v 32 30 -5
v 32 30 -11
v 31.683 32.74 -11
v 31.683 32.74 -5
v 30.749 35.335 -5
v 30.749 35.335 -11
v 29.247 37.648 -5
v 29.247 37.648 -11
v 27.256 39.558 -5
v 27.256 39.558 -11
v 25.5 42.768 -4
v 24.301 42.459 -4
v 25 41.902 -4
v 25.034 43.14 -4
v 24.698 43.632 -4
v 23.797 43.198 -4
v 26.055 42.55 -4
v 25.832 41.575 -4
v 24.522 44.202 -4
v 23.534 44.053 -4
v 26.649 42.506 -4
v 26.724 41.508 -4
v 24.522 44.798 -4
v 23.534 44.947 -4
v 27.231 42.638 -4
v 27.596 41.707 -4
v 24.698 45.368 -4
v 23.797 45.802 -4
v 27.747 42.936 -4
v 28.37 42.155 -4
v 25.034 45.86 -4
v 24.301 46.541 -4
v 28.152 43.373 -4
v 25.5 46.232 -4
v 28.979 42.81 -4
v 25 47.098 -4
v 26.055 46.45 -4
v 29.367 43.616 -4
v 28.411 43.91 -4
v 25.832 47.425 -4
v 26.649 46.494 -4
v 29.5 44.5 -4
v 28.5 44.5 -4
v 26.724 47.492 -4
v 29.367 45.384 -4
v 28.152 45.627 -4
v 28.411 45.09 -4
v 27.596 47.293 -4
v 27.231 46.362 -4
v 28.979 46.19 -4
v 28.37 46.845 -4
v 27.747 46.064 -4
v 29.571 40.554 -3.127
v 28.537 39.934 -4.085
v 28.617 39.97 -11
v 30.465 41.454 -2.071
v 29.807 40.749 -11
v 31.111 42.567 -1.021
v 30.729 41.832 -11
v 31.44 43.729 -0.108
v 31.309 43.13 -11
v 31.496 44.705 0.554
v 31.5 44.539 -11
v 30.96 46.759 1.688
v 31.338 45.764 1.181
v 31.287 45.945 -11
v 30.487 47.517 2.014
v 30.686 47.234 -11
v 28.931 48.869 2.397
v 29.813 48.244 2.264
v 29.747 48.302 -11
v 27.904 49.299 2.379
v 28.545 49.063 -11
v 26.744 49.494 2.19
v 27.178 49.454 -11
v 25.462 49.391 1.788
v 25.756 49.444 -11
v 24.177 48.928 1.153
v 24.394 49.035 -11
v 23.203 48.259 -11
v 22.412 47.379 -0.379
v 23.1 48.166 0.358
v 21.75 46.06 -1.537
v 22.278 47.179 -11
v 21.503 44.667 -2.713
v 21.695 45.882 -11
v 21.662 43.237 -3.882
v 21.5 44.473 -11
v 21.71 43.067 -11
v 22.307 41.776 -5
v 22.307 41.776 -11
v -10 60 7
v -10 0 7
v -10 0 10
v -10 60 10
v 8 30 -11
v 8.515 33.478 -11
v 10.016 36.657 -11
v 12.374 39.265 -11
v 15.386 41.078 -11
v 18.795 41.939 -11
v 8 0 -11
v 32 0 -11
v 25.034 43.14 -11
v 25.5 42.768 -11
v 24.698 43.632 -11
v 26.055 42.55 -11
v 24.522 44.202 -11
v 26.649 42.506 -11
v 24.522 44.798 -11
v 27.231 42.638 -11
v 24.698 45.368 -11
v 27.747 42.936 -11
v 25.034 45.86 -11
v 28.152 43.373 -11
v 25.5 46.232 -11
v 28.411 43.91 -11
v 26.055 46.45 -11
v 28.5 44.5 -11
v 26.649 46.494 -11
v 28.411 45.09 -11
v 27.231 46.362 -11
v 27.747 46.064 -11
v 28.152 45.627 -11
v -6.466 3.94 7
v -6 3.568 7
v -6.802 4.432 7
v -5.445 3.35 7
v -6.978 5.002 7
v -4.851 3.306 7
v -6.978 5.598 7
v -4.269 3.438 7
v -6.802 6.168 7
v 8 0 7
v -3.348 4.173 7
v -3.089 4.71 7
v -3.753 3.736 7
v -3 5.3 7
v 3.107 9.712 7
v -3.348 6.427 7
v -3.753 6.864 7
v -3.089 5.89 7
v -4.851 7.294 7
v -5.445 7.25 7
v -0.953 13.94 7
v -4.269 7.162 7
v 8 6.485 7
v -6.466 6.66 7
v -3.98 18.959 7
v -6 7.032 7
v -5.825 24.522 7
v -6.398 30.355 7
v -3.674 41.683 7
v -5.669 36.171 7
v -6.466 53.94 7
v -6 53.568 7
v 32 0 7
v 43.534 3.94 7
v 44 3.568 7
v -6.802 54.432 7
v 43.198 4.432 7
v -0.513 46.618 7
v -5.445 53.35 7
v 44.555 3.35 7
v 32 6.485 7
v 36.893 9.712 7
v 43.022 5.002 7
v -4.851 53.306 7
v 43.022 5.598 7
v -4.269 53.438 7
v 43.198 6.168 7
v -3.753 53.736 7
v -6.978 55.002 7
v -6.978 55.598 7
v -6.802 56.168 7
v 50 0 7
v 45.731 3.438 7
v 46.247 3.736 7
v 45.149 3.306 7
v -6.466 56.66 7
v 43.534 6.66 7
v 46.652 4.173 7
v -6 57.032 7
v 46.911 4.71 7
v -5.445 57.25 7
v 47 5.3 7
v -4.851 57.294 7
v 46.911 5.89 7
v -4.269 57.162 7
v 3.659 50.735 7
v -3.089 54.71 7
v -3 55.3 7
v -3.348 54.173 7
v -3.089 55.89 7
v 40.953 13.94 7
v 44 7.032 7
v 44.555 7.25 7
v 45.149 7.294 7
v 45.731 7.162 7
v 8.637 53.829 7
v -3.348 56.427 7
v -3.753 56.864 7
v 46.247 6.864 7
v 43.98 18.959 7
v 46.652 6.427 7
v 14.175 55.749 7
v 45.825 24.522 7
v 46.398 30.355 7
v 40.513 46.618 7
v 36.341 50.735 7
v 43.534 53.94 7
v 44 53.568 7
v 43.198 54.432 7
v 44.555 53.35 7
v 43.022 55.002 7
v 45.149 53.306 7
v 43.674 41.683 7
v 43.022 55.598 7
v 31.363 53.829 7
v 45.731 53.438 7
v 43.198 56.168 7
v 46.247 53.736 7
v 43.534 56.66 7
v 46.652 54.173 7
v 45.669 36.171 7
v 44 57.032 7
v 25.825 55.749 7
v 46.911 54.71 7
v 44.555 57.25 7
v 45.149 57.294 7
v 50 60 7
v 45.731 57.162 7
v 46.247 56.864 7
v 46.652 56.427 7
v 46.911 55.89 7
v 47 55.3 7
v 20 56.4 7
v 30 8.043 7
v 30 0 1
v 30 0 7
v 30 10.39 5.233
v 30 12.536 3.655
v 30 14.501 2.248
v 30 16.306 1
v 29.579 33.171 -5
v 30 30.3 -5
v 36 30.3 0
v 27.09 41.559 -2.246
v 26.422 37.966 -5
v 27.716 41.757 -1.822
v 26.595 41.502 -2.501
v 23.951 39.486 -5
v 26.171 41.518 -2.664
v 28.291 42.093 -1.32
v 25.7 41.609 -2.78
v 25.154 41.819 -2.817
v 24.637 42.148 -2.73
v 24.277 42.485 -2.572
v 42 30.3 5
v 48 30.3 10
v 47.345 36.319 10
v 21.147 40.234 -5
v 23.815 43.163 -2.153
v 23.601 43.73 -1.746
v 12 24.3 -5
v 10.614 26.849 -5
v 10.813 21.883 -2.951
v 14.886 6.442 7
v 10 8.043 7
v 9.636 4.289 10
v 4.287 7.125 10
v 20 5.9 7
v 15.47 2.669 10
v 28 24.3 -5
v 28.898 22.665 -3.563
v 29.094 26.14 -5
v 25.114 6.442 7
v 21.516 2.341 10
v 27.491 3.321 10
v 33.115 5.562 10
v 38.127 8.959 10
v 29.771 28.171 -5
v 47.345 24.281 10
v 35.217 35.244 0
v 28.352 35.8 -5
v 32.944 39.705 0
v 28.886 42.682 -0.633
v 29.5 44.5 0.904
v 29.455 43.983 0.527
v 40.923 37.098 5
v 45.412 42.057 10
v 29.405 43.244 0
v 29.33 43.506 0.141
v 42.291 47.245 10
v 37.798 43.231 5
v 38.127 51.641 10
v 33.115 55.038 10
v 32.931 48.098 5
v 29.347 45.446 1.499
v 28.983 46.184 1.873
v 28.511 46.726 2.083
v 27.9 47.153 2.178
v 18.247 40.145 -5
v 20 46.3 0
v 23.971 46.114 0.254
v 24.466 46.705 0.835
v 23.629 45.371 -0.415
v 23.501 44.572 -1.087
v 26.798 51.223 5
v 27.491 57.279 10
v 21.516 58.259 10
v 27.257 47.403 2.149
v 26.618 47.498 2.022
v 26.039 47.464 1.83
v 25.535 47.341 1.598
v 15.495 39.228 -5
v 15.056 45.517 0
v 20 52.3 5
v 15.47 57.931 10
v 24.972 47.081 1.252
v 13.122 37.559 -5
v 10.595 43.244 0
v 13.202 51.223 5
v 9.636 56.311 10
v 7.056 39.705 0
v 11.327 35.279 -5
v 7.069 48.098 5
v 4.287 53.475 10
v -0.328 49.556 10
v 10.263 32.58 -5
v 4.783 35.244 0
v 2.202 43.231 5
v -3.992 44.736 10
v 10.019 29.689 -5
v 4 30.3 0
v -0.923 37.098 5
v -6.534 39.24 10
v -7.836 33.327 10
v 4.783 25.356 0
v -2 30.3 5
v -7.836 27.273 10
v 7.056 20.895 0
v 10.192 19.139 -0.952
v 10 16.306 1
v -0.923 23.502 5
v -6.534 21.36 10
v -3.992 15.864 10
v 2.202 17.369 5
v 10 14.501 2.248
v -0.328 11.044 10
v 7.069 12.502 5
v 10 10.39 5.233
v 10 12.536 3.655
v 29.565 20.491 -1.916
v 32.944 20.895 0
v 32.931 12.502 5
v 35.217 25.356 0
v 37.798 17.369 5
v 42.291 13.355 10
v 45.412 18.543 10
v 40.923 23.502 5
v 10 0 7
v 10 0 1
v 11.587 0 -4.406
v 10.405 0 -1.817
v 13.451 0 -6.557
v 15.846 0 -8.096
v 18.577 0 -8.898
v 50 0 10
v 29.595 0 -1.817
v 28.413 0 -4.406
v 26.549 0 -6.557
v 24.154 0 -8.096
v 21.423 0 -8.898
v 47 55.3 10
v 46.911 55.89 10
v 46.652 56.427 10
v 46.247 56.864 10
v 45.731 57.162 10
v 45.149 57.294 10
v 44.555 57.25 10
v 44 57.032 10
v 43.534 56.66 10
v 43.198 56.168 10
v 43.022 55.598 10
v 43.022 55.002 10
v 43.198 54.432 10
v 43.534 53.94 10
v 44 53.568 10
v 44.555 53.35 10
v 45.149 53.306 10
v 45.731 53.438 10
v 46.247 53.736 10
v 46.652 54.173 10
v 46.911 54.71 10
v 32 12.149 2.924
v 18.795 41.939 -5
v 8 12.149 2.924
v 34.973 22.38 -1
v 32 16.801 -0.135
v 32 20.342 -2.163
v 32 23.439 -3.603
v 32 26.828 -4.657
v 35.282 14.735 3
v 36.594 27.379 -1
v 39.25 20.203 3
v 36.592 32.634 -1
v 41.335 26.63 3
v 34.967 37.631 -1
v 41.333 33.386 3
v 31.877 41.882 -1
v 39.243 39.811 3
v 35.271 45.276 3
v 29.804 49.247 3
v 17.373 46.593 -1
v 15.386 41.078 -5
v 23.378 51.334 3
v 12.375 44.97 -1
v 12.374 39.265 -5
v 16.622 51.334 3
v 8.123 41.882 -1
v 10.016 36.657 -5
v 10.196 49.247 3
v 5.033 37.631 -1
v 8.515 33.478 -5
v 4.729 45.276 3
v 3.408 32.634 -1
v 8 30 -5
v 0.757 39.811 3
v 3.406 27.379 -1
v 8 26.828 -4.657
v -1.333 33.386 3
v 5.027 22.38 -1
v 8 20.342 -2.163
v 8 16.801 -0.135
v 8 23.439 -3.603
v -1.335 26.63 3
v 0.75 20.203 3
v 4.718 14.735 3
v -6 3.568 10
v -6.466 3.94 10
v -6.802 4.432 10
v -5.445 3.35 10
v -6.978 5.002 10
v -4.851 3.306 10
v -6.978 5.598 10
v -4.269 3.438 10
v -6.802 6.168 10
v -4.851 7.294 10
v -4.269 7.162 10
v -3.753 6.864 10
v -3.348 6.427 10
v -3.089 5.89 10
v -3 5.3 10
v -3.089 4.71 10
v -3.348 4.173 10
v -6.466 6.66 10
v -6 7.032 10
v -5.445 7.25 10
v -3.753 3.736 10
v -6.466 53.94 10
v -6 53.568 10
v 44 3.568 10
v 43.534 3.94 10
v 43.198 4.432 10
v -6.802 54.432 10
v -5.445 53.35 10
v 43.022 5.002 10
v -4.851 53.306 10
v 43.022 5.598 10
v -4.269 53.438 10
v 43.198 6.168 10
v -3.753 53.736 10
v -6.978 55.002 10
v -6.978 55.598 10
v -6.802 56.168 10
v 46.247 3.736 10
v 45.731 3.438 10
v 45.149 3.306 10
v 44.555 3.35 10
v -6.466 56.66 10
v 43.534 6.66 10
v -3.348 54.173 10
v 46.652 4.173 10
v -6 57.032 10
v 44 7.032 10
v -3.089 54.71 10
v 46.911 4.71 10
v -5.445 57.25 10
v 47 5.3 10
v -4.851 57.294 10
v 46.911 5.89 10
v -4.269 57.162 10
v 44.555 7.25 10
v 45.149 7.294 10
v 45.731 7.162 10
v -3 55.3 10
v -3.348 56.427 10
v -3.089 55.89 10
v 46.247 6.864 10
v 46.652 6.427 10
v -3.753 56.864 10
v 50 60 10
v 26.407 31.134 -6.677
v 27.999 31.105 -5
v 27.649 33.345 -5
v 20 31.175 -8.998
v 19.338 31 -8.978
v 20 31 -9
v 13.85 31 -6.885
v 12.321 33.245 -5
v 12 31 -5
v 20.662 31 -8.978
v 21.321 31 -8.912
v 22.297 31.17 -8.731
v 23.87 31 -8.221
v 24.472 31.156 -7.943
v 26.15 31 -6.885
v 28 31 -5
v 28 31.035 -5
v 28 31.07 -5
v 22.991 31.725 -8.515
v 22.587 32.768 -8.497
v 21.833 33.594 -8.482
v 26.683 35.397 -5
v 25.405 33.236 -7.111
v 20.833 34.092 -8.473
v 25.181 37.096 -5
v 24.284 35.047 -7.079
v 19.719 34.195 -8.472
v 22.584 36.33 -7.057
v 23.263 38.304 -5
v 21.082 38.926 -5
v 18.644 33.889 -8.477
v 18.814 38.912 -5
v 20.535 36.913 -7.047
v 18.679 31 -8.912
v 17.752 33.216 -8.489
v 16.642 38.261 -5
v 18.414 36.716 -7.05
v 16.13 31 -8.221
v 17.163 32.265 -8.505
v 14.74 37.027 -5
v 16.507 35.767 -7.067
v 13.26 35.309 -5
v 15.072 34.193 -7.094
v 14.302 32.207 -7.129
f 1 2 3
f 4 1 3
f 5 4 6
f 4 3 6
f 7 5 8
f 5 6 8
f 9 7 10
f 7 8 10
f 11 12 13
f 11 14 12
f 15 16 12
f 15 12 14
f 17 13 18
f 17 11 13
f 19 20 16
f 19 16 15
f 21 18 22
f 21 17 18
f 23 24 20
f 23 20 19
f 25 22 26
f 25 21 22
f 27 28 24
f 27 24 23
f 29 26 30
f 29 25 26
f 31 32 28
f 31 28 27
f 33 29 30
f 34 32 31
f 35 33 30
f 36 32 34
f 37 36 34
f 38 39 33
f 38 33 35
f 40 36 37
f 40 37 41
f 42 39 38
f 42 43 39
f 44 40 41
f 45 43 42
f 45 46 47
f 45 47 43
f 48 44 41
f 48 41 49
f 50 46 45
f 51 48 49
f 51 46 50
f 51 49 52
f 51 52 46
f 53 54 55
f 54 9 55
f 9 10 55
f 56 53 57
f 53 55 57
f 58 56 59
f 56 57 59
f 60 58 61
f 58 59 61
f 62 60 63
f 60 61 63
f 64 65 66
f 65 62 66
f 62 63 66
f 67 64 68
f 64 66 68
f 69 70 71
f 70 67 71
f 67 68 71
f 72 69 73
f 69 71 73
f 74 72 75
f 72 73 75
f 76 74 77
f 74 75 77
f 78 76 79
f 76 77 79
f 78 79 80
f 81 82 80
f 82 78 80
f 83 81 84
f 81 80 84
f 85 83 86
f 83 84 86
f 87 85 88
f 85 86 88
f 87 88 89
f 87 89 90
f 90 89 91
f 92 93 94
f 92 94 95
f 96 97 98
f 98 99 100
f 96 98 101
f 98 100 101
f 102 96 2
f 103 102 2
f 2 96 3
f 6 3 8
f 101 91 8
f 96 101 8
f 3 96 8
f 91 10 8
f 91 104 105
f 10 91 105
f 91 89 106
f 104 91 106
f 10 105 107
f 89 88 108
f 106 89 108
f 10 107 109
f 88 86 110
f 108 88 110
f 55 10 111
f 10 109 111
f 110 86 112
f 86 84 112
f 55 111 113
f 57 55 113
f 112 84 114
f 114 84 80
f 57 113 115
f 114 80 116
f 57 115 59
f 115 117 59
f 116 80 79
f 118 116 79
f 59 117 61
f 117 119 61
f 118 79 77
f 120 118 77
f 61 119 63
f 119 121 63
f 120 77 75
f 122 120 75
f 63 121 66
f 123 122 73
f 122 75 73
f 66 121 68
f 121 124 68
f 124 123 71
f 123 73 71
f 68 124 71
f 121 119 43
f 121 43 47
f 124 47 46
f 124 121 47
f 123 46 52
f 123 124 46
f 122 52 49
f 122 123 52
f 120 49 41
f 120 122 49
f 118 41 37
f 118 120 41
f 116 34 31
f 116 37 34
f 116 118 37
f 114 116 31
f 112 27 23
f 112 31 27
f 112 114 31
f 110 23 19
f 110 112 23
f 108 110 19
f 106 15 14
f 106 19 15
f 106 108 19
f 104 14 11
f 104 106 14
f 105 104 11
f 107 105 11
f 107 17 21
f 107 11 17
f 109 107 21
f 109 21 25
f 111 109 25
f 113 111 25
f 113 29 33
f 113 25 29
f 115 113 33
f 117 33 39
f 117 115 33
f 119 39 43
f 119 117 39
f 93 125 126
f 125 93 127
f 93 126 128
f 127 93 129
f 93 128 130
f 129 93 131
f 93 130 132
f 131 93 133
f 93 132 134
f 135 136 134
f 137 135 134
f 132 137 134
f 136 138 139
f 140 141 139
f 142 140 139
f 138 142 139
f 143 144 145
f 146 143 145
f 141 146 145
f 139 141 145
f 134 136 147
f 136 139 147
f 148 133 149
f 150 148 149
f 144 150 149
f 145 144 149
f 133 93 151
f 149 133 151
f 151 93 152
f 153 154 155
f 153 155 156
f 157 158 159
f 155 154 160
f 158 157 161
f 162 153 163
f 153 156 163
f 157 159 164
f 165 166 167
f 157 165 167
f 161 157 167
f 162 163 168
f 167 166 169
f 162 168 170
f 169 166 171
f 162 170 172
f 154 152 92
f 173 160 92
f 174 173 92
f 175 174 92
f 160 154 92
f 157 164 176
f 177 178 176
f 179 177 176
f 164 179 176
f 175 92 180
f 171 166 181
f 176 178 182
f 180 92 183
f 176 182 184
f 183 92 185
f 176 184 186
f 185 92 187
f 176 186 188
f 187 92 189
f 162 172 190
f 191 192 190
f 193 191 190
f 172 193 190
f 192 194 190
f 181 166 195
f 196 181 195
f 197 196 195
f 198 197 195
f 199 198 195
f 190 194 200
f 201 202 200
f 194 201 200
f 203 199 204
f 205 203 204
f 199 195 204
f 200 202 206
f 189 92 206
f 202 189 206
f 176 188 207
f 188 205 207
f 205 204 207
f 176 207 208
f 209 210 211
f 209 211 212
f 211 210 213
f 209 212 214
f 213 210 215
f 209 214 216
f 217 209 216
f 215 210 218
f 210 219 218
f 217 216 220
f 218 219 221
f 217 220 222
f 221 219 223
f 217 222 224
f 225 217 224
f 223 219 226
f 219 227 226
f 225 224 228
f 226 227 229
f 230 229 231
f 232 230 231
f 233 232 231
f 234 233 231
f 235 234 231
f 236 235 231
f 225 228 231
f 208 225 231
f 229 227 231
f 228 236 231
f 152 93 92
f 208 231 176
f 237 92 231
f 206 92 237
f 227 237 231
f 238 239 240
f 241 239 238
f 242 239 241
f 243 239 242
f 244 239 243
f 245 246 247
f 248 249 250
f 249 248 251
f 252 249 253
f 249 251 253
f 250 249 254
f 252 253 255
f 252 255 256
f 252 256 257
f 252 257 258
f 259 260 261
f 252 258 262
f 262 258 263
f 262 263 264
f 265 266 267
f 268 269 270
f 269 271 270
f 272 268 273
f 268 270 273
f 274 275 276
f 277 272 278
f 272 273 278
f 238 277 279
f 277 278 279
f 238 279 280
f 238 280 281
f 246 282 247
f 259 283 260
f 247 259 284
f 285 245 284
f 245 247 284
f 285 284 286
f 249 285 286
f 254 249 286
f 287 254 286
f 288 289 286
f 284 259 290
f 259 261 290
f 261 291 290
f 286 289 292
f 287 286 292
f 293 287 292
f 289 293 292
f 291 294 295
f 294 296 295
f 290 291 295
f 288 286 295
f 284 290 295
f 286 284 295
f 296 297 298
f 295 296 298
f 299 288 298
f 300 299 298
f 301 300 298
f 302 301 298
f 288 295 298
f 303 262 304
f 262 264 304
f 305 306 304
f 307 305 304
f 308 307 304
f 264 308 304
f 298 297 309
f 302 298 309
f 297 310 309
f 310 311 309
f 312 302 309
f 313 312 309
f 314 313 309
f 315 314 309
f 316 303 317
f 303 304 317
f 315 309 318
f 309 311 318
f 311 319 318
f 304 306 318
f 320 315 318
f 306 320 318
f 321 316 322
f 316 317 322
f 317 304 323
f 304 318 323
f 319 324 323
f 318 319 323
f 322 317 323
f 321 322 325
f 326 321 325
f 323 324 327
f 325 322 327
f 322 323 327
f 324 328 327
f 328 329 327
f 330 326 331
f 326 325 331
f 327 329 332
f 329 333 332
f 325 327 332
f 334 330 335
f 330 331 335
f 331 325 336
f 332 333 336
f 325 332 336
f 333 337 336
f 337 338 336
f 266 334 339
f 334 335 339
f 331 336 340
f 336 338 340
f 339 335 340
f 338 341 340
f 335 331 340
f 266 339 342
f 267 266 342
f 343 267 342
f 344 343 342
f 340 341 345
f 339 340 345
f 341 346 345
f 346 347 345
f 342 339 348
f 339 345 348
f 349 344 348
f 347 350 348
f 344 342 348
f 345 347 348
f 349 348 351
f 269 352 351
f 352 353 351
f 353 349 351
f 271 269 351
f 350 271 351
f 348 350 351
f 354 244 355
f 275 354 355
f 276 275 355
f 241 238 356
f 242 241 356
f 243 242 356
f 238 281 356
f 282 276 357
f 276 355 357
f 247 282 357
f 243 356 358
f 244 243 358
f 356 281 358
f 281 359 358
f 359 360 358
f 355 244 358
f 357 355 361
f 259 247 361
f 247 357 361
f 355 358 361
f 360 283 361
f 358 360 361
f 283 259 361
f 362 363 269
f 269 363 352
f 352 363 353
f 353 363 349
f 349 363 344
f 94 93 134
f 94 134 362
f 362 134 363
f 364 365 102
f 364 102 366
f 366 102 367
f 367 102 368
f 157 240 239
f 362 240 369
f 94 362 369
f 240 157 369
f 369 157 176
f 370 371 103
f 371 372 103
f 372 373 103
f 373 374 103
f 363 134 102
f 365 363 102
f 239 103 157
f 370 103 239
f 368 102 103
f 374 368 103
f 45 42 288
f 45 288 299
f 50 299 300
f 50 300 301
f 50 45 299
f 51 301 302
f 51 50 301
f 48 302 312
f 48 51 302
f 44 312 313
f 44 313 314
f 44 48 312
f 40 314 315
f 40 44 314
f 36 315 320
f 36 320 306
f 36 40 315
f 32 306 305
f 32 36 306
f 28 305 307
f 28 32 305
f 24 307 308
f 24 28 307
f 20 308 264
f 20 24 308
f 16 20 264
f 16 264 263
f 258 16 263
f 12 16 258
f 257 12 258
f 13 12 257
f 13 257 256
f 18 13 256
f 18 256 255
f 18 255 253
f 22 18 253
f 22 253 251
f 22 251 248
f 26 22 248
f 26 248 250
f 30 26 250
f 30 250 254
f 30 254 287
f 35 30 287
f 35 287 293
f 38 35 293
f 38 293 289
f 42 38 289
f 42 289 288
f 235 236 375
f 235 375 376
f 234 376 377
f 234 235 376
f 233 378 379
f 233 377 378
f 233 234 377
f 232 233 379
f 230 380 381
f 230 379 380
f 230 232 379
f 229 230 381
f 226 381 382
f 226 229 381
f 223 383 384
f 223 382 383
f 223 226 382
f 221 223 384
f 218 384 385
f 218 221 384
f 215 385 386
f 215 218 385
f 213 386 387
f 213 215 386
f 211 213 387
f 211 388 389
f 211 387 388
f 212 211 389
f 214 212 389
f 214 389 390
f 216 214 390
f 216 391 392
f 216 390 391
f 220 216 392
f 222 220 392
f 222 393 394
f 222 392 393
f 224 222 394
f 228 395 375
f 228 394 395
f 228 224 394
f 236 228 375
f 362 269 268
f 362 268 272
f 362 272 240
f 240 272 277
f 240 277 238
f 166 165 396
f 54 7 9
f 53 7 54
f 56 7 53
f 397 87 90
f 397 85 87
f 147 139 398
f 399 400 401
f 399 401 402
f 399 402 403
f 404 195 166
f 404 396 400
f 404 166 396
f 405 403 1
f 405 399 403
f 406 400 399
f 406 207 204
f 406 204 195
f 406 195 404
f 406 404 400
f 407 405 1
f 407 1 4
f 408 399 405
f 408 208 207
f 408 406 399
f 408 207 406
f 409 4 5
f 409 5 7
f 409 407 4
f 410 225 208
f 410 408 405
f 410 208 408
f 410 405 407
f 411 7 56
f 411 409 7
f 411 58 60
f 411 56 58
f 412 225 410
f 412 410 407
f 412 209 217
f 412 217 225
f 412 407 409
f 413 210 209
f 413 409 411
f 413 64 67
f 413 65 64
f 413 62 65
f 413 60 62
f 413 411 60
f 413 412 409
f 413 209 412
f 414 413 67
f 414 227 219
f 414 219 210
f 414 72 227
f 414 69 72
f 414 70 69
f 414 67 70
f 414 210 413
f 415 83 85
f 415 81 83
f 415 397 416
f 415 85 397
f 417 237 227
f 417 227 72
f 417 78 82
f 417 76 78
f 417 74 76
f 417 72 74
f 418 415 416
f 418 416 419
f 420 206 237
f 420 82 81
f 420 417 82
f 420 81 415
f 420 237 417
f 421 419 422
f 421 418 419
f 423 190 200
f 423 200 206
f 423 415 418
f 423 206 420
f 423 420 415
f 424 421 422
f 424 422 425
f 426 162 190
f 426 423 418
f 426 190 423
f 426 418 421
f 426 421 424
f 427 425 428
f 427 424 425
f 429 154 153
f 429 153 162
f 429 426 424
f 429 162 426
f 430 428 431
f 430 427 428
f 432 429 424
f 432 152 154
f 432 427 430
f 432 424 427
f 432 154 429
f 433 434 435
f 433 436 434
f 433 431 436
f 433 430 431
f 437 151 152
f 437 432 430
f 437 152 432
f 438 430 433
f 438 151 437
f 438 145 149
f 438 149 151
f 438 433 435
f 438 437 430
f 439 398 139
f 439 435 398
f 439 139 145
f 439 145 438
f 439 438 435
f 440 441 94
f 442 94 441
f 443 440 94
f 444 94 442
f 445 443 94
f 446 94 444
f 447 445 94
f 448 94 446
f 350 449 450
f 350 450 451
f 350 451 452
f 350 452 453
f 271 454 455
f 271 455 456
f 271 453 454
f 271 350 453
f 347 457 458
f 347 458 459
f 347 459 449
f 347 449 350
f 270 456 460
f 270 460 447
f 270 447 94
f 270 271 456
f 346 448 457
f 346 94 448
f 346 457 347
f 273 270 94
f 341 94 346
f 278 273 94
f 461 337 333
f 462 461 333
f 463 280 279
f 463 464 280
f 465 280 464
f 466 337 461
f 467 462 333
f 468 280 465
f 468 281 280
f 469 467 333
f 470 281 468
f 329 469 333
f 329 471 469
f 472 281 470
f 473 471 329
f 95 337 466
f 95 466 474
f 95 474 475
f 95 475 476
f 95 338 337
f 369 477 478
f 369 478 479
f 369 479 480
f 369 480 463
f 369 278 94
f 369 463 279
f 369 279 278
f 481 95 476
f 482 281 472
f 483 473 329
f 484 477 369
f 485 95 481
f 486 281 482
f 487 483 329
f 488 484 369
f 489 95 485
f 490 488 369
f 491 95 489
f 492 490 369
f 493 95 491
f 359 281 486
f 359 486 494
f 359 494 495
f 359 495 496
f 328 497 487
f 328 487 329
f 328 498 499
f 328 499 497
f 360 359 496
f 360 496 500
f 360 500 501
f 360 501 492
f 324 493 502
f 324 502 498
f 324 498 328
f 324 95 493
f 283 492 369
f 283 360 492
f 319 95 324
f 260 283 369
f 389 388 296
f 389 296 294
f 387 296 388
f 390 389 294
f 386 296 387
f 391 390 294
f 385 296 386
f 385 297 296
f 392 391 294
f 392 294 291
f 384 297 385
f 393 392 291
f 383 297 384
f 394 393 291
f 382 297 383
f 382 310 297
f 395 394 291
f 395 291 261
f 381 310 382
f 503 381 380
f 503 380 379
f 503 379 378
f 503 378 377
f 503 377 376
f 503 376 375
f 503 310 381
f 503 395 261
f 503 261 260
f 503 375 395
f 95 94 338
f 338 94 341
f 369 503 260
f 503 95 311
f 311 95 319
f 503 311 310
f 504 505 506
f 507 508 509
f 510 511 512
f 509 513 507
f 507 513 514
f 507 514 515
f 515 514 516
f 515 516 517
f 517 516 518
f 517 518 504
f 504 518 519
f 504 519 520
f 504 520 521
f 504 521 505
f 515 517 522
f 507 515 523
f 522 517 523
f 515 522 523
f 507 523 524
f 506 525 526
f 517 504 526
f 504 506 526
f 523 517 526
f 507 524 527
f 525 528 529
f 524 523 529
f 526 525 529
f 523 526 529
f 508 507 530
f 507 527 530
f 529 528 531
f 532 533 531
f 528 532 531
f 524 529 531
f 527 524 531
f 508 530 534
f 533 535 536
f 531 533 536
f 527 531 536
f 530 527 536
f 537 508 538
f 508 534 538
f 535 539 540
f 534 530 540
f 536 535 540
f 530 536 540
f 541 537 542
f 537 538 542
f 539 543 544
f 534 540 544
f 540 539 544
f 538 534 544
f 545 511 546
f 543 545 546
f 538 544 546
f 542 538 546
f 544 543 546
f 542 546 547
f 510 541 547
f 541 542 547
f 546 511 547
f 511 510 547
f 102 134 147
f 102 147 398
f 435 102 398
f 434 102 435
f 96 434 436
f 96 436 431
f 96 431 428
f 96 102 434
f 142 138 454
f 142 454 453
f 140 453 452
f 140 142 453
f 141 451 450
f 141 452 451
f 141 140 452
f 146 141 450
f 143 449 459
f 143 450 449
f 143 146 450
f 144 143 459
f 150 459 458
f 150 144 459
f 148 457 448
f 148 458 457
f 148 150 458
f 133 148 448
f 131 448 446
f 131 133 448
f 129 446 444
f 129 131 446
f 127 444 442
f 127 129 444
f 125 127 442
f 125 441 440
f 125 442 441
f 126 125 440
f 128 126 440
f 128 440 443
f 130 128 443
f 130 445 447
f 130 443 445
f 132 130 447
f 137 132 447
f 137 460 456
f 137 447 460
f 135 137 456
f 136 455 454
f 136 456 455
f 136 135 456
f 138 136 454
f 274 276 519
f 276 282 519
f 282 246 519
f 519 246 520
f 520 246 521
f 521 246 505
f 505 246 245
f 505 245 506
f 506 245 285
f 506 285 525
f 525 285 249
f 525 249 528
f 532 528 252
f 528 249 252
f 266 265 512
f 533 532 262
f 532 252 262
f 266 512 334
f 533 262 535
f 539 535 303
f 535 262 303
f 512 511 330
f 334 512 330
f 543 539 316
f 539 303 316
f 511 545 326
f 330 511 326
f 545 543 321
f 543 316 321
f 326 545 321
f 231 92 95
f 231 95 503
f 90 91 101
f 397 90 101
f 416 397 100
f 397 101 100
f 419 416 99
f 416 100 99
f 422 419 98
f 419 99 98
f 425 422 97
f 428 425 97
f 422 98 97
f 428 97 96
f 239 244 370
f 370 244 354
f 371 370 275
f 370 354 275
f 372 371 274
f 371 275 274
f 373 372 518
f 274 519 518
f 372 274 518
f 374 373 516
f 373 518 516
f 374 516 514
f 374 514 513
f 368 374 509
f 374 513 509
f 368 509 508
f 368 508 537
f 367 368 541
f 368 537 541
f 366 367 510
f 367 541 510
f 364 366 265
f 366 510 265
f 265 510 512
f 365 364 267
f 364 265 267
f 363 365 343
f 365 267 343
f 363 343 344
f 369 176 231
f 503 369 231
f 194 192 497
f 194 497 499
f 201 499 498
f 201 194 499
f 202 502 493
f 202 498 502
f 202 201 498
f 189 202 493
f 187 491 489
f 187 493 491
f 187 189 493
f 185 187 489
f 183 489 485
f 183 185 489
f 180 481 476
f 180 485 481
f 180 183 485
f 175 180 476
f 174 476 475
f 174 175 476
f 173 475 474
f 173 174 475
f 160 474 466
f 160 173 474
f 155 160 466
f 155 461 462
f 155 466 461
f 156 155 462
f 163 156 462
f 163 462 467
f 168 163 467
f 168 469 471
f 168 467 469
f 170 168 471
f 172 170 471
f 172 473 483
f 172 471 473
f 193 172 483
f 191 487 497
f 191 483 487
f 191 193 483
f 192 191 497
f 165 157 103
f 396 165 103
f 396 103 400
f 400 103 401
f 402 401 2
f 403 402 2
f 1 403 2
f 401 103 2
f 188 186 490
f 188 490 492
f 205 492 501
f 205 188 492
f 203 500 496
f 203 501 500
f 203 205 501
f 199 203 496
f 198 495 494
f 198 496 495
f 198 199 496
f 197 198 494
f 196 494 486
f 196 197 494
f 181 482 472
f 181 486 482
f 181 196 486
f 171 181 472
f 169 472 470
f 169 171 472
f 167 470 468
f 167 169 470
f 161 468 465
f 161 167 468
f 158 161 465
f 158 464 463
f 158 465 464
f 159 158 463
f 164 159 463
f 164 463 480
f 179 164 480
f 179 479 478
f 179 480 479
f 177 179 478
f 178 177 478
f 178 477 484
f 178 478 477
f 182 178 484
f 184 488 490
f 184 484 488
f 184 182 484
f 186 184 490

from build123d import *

# Parameters (mm, degrees)
CYLINDER002003_R     = 2
CYLINDER002003_DEPTH = 30
CYLINDER002004_R     = 3
CYLINDER002004_DEPTH = 11
CYLINDER_W           = 10
CYLINDER_H           = 31
CYLINDER_ANGLE       = 180
CYLINDER_ROLL_ANGLE  = -90
CYLINDER002006_R     = 10
CYLINDER002006_DEPTH = 6
SPHERE001_ROLL_ANGLE = 1
BOX008_W             = 20
BOX008_H             = 31
BOX008_DEPTH         = 6
CYLINDER006_R        = 2
CYLINDER006_DEPTH    = 10
CYLINDER008_R        = 2
CYLINDER008_DEPTH    = 10
CYLINDER007_R        = 2
CYLINDER007_DEPTH    = 10
CYLINDER005_R        = 2
CYLINDER005_DEPTH    = 10
CYLINDER001_R        = 12
CYLINDER001_DEPTH    = 12
BOX003_W             = 24
BOX003_H             = 30
BOX003_DEPTH         = 18
BOX_W                = 60
BOX_H                = 60
BOX_DEPTH            = 3
CYLINDER002002_R     = 5
CYLINDER002002_DEPTH = 15


with BuildPart() as haltebohrungoben:
    # Cylinder002003 → Cylinder002003 (new body)
    with BuildSketch(Plane(origin=(26.5, 44.5, -13), x_dir=(1, 0, 0), z_dir=(0, 0, 1))):
        Circle(CYLINDER002003_R)
    extrude(amount=CYLINDER002003_DEPTH)


with BuildPart() as schnittkegel:
    # Cone003 → Cone003 (revolve)
    with BuildSketch(Plane(origin=(20, 30.3, -5), x_dir=(1, 0, 0), z_dir=(0, -1, 0))):
        Polygon((0, 0), (10, 0), (28, 15), (0, 15), align=None)
    revolve(axis=Axis((20, 30.3, -5), (0, 0, 1)))


with BuildPart() as haltesenkeoben:
    # Cylinder002004 → Cylinder002004 (new body)
    with BuildSketch(Plane(origin=(26.5, 44.5, -4), x_dir=(1, 0, 0), z_dir=(0, 0, 1))):
        Circle(CYLINDER002004_R)
    extrude(amount=CYLINDER002004_DEPTH)


with BuildPart() as zylinder:
    # Cylinder → Cylinder (revolve)
    with BuildSketch(Plane.XZ):
        with Locations((5, 15.5)):
            Rectangle(CYLINDER_W, CYLINDER_H)
    revolve(axis=Axis((0, 0, 0), (0, 0, 1)), revolution_arc=CYLINDER_ANGLE)


with BuildPart() as zylinder_1:
    # Cylinder roll: moved
    add(zylinder.part.rotate(Axis((0, 0, 0), (1, 0, 0)), CYLINDER_ROLL_ANGLE))


with BuildPart() as zylinder_2:
    # Cylinder placement: moved
    add(zylinder_1.part.moved(Location((20, -11, 1))))


with BuildPart() as zylinder014:
    # Cylinder002006 → Cylinder002006 (new body)
    with BuildSketch(Plane(origin=(20, 20, 1), x_dir=(1, 0, 0), z_dir=(0, 0, 1))):
        Circle(CYLINDER002006_R)
    extrude(amount=CYLINDER002006_DEPTH)


with BuildPart() as kugel001:
    # Sphere001 → Sphere001 (revolve)
    with BuildSketch(Plane.XZ):
        with BuildLine():
            ThreePointArc((0, -10), (10, 0), (0, 10))
            Line((0, 10), (0, -10))
        make_face()
    revolve(axis=Axis((0, 0, 0), (0, 0, 1)))


with BuildPart() as kugel001_1:
    # Sphere001 roll: moved
    add(kugel001.part.rotate(Axis((0, 0, 0), (1, 0, 0)), SPHERE001_ROLL_ANGLE))


with BuildPart() as kugel001_2:
    # Sphere001 placement: moved
    add(kugel001_1.part.moved(Location((20, 20, 1))))


with BuildPart() as luftschacht:
    # Box008 → Box008 (new body)
    with BuildSketch(Plane(origin=(10, -11, 1), x_dir=(1, 0, 0), z_dir=(0, 0, 1))):
        with Locations((10, 15.5)):
            Rectangle(BOX008_W, BOX008_H)
    extrude(amount=BOX008_DEPTH)

    # Fusion011: union Zylinder, Zylinder014, Kugel001
    add(zylinder_2.part)
    add(zylinder014.part)
    add(kugel001_2.part)


with BuildPart() as luftschacht_1:
    # Fusion011 placement: moved
    add(luftschacht.part.moved(Location((0, 11, 0))))


with BuildPart() as zylinder006:
    # Cylinder006 → Cylinder006 (new body)
    with BuildSketch(Plane(origin=(0, 50, 0), x_dir=(1, 0, 0), z_dir=(0, 0, 1))):
        Circle(CYLINDER006_R)
    extrude(amount=CYLINDER006_DEPTH)


with BuildPart() as zylinder008:
    # Cylinder008 → Cylinder008 (new body)
    with BuildSketch(Plane(origin=(50, 50, 0), x_dir=(1, 0, 0), z_dir=(0, 0, 1))):
        Circle(CYLINDER008_R)
    extrude(amount=CYLINDER008_DEPTH)


with BuildPart() as zylinder007:
    # Cylinder007 → Cylinder007 (new body)
    with BuildSketch(Plane(origin=(50, 0, 0), x_dir=(1, 0, 0), z_dir=(0, 0, 1))):
        Circle(CYLINDER007_R)
    extrude(amount=CYLINDER007_DEPTH)


with BuildPart() as hohlraum:
    # Cylinder005 → Cylinder005 (new body)
    with BuildSketch(Plane.XY):
        Circle(CYLINDER005_R)
    extrude(amount=CYLINDER005_DEPTH)

    # Fusion008: union Zylinder006, Zylinder008, Zylinder007
    add(zylinder006.part)
    add(zylinder008.part)
    add(zylinder007.part)


with BuildPart() as hohlraum_1:
    # Fusion008 placement: moved
    add(hohlraum.part.moved(Location((-5, 5.3, 2))))

    # Fusion012: union HalteBohrungOben, SchnittKegel, HalteSenkeOben, LuftSchacht
    add(haltebohrungoben.part)
    add(schnittkegel.part)
    add(haltesenkeoben.part)
    add(luftschacht_1.part)


with BuildPart() as zylinder001:
    # Cylinder001 → Cylinder001 (new body)
    with BuildSketch(Plane(origin=(20, 20, -11), x_dir=(1, 0, 0), z_dir=(0, 0, 1))):
        Circle(CYLINDER001_R)
    extrude(amount=CYLINDER001_DEPTH)


with BuildPart() as aussen:
    # Box003 → Box003 (new body)
    with BuildSketch(Plane(origin=(8, -10, -11), x_dir=(1, 0, 0), z_dir=(0, 0, 1))):
        with Locations((12, 15)):
            Rectangle(BOX003_W, BOX003_H)
    extrude(amount=BOX003_DEPTH)

    # Fusion003: union Zylinder001
    add(zylinder001.part)


with BuildPart() as aussen_1:
    # Fusion003 placement: moved
    add(aussen.part.moved(Location((0, 10, 0))))


with BuildPart() as w_rfel:
    # Box → Box (new body)
    with BuildSketch(Plane(origin=(-10, 0, 7), x_dir=(1, 0, 0), z_dir=(0, 0, 1))):
        with Locations((30, 30)):
            Rectangle(BOX_W, BOX_H)
    extrude(amount=BOX_DEPTH)


with BuildPart() as wall:
    # Cone001 → Cone001 (revolve)
    with BuildSketch(Plane(origin=(20, 30, -5), x_dir=(1, 0, 0), z_dir=(0, -1, 0))):
        Polygon((0, 0), (12, 0), (30, 15), (0, 15), align=None)
    revolve(axis=Axis((20, 30, -5), (0, 0, 1)))

    # Fusion: union Würfel
    add(w_rfel.part)

    # Fusion006: union aussen
    add(aussen_1.part)


with BuildPart() as fanduct:
    # Cylinder002002 → Cylinder002002 (new body)
    with BuildSketch(Plane(origin=(26.5, 44.5, -11), x_dir=(1, 0, 0), z_dir=(0, 0, 1))):
        Circle(CYLINDER002002_R)
    extrude(amount=CYLINDER002002_DEPTH)

    # Fusion013: union Wall
    add(wall.part)

    # Cut: cut Hohlraum
    add(hohlraum_1.part, mode=Mode.SUBTRACT)


solid = fanduct.part
